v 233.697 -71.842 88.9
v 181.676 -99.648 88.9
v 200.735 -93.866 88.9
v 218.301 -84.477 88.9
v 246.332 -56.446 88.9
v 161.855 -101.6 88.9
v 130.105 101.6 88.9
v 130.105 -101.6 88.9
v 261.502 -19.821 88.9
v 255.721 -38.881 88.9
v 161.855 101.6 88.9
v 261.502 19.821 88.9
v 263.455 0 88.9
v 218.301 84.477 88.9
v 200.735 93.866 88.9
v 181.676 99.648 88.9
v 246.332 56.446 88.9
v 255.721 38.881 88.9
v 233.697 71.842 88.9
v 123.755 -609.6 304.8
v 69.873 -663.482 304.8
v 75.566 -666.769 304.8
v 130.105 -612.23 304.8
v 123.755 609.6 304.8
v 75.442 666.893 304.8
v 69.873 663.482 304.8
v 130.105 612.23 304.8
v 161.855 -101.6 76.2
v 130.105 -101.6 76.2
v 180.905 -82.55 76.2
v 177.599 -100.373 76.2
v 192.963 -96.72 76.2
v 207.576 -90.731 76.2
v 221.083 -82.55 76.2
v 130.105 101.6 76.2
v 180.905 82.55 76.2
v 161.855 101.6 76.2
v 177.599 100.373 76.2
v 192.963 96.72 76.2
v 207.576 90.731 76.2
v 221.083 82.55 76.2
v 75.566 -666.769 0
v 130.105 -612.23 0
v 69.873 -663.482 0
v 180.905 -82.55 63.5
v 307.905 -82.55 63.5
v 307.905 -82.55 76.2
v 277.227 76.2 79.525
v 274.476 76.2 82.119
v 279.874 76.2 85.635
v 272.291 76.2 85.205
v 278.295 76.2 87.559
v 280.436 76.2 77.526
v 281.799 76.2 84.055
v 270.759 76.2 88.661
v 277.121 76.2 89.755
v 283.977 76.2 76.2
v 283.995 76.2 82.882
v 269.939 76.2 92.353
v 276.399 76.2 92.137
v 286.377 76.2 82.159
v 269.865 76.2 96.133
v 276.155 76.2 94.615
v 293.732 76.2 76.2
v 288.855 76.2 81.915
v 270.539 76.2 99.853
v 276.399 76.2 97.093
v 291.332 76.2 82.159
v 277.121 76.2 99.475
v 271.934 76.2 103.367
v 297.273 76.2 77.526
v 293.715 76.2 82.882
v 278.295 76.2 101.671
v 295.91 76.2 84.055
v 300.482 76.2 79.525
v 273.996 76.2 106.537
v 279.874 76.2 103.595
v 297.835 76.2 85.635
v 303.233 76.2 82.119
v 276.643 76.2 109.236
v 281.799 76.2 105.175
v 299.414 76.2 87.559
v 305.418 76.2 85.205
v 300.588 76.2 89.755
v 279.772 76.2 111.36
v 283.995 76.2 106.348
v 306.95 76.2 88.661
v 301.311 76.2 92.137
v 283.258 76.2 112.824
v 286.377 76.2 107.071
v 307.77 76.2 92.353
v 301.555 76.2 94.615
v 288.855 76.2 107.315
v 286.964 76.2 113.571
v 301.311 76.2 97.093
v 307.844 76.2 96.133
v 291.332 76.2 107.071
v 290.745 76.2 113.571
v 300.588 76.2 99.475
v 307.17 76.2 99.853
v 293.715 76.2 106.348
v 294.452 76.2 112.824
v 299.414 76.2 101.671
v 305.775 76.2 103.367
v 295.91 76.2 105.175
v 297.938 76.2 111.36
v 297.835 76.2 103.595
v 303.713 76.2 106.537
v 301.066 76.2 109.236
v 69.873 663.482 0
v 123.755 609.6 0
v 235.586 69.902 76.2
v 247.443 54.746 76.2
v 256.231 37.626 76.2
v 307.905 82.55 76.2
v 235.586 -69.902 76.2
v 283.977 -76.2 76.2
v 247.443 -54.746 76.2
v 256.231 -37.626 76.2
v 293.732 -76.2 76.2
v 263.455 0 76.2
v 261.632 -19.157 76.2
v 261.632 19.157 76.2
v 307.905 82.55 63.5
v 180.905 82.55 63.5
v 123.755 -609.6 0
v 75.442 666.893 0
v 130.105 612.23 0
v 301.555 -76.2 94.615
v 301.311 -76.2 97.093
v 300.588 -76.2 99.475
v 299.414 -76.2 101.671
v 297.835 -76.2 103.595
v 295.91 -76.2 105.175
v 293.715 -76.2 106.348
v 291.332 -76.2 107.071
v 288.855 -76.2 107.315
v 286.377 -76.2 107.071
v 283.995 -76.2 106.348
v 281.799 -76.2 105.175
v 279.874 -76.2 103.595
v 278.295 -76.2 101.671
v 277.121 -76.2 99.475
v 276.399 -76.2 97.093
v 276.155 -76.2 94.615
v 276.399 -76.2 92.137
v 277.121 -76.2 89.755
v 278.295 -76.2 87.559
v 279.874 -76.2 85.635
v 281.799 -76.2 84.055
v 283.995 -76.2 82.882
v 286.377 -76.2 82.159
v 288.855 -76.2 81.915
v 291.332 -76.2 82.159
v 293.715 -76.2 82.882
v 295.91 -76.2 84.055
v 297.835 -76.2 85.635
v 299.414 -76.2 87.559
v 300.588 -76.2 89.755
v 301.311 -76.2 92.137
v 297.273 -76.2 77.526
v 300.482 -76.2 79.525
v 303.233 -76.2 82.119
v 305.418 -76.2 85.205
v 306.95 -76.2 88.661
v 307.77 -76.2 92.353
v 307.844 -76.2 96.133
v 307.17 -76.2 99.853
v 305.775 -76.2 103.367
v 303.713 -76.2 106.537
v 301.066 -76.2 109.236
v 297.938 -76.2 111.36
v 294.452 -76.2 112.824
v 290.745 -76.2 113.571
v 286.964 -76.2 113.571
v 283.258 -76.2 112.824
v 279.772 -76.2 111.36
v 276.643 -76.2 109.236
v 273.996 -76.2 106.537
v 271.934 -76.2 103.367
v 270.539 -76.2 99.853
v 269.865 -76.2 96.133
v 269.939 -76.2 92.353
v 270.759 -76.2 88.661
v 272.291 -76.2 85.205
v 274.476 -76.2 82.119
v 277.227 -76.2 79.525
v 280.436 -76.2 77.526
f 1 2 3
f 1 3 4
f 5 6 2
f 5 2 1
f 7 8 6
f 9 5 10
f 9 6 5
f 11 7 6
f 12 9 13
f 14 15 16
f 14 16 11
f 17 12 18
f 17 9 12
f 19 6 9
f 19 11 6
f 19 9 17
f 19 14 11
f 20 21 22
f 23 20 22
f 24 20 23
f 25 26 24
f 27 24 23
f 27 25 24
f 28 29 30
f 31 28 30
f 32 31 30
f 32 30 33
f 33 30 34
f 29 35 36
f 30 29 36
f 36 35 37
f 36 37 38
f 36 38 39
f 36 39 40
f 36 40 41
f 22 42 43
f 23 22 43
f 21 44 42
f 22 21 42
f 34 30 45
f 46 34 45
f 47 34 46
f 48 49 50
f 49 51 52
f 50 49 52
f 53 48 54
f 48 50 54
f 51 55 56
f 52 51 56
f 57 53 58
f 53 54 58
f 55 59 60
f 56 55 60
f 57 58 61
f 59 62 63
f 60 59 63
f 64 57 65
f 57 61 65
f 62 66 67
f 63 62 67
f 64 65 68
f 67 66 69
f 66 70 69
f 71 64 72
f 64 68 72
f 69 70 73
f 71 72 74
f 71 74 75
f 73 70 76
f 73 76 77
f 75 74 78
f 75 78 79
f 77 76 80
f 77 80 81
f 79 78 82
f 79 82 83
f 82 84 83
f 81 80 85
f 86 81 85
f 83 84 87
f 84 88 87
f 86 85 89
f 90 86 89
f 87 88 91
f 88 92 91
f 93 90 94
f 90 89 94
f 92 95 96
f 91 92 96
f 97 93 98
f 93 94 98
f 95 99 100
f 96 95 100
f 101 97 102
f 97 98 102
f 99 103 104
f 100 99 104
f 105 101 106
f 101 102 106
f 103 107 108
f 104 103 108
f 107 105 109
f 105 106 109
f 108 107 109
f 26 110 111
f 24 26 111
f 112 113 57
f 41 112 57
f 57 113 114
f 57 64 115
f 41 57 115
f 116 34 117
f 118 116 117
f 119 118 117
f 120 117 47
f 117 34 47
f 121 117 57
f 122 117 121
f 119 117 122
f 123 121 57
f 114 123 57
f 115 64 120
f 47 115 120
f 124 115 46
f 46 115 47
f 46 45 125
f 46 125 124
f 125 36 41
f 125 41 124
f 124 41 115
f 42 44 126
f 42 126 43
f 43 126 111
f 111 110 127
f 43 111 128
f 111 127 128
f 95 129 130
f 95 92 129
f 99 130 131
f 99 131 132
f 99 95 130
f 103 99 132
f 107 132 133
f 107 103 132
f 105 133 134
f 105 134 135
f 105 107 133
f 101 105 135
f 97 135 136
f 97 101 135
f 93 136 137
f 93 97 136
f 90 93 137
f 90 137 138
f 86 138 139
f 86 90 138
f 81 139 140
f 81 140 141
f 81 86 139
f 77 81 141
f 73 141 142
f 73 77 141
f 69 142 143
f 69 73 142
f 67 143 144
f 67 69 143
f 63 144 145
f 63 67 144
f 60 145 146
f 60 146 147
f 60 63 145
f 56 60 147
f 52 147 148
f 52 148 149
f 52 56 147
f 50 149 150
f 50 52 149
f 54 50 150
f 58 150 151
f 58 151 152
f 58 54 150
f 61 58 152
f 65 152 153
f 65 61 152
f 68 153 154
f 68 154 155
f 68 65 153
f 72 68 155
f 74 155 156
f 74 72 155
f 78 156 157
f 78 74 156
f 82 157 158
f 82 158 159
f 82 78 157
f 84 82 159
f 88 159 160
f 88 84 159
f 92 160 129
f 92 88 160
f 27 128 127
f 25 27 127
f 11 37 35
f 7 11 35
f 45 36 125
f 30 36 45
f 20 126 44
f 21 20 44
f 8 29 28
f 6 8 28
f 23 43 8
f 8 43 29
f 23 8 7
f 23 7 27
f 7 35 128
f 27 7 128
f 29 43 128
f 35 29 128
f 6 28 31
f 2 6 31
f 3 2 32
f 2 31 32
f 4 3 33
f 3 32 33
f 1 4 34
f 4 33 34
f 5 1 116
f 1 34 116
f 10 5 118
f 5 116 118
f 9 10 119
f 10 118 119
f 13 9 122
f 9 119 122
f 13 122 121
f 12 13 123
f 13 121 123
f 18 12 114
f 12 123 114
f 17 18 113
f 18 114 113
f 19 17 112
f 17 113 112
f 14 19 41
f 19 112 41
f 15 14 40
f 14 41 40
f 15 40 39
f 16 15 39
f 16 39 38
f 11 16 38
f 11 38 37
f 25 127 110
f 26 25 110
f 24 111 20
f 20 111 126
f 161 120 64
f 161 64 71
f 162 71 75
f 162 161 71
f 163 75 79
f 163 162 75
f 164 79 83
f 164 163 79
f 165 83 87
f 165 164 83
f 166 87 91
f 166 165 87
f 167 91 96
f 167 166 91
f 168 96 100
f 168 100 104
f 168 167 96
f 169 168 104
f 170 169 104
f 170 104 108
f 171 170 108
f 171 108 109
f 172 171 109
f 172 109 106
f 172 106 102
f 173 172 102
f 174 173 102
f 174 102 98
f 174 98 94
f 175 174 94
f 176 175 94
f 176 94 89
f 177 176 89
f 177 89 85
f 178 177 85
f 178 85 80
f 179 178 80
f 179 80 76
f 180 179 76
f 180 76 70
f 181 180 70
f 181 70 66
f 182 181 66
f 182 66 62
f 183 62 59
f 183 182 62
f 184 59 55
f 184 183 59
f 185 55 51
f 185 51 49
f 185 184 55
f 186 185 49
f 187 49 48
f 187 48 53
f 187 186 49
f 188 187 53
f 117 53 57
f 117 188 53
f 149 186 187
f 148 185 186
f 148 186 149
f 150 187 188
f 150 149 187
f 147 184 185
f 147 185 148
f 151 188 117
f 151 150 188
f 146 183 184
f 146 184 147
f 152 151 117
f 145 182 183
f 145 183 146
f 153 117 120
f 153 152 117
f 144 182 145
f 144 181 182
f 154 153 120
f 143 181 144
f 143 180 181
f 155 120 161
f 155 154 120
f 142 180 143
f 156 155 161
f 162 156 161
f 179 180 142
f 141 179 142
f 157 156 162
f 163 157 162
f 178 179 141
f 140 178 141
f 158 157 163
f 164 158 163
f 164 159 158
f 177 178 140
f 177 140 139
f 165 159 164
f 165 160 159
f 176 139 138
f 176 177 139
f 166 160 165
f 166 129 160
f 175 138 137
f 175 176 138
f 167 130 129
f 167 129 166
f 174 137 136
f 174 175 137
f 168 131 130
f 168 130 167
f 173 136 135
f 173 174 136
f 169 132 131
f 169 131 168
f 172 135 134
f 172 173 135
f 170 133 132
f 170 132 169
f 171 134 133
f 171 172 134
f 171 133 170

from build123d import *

# Parameters (mm, degrees)
F1_DEPTH = 304.8
F4_DEPTH = 12.7
F5_W     = 127
F5_H     = 165.1
F6_DEPTH = 12.7
F7_R     = 19.05
F7_R_2   = 12.7
F8_DEPTH = 76.2


with BuildPart() as f1:
    # F0 (on Top) → F1 (new body)
    with BuildSketch(Plane.XY):
        Polygon((123.7545942165, 609.6), (123.7545942165, -609.6), (69.8730574901, -663.4815367264), (75.5663116695, -666.7685385595), (130.1045942165, -612.2302560125), (130.1045942165, 612.2302561211), (75.4418789804, 666.8929713571), (69.8730574901, 663.4815367264), align=None)
    extrude(amount=F1_DEPTH)

    # F3 (on offset) → F4 (join)
    with BuildSketch(Plane.XY.offset(76.2)):
        with BuildLine():
            Line((130.1045942165, 101.6), (130.1045942165, -101.6))
            Line((130.1045942165, -101.6), (161.8545942165, -101.6))
            ThreePointArc((161.8545942165, -101.6), (263.4545942165, 0), (161.8545942165, 101.6))
            Line((161.8545942165, 101.6), (130.1045942165, 101.6))
        make_face()
    extrude(amount=F4_DEPTH)

    # F5 (on face) → F6 (join)
    with BuildSketch(Plane(origin=(0, 0, 76.2), x_dir=(1, 0, 0), z_dir=(0, 0, -1))):
        with Locations((244.4045942165, 0)):
            Rectangle(F5_W, F5_H)
    extrude(amount=F6_DEPTH)

    # F7 (on Front) → F8 (join, symmetric)
    with BuildSketch(Plane.XZ):
        with Locations((288.8545942165, 94.615)):
            Circle(F7_R)
        with Locations((288.8545942165, 94.615)):
            Circle(F7_R_2, mode=Mode.SUBTRACT)
    extrude(amount=F8_DEPTH, both=True)


solid = f1.part
